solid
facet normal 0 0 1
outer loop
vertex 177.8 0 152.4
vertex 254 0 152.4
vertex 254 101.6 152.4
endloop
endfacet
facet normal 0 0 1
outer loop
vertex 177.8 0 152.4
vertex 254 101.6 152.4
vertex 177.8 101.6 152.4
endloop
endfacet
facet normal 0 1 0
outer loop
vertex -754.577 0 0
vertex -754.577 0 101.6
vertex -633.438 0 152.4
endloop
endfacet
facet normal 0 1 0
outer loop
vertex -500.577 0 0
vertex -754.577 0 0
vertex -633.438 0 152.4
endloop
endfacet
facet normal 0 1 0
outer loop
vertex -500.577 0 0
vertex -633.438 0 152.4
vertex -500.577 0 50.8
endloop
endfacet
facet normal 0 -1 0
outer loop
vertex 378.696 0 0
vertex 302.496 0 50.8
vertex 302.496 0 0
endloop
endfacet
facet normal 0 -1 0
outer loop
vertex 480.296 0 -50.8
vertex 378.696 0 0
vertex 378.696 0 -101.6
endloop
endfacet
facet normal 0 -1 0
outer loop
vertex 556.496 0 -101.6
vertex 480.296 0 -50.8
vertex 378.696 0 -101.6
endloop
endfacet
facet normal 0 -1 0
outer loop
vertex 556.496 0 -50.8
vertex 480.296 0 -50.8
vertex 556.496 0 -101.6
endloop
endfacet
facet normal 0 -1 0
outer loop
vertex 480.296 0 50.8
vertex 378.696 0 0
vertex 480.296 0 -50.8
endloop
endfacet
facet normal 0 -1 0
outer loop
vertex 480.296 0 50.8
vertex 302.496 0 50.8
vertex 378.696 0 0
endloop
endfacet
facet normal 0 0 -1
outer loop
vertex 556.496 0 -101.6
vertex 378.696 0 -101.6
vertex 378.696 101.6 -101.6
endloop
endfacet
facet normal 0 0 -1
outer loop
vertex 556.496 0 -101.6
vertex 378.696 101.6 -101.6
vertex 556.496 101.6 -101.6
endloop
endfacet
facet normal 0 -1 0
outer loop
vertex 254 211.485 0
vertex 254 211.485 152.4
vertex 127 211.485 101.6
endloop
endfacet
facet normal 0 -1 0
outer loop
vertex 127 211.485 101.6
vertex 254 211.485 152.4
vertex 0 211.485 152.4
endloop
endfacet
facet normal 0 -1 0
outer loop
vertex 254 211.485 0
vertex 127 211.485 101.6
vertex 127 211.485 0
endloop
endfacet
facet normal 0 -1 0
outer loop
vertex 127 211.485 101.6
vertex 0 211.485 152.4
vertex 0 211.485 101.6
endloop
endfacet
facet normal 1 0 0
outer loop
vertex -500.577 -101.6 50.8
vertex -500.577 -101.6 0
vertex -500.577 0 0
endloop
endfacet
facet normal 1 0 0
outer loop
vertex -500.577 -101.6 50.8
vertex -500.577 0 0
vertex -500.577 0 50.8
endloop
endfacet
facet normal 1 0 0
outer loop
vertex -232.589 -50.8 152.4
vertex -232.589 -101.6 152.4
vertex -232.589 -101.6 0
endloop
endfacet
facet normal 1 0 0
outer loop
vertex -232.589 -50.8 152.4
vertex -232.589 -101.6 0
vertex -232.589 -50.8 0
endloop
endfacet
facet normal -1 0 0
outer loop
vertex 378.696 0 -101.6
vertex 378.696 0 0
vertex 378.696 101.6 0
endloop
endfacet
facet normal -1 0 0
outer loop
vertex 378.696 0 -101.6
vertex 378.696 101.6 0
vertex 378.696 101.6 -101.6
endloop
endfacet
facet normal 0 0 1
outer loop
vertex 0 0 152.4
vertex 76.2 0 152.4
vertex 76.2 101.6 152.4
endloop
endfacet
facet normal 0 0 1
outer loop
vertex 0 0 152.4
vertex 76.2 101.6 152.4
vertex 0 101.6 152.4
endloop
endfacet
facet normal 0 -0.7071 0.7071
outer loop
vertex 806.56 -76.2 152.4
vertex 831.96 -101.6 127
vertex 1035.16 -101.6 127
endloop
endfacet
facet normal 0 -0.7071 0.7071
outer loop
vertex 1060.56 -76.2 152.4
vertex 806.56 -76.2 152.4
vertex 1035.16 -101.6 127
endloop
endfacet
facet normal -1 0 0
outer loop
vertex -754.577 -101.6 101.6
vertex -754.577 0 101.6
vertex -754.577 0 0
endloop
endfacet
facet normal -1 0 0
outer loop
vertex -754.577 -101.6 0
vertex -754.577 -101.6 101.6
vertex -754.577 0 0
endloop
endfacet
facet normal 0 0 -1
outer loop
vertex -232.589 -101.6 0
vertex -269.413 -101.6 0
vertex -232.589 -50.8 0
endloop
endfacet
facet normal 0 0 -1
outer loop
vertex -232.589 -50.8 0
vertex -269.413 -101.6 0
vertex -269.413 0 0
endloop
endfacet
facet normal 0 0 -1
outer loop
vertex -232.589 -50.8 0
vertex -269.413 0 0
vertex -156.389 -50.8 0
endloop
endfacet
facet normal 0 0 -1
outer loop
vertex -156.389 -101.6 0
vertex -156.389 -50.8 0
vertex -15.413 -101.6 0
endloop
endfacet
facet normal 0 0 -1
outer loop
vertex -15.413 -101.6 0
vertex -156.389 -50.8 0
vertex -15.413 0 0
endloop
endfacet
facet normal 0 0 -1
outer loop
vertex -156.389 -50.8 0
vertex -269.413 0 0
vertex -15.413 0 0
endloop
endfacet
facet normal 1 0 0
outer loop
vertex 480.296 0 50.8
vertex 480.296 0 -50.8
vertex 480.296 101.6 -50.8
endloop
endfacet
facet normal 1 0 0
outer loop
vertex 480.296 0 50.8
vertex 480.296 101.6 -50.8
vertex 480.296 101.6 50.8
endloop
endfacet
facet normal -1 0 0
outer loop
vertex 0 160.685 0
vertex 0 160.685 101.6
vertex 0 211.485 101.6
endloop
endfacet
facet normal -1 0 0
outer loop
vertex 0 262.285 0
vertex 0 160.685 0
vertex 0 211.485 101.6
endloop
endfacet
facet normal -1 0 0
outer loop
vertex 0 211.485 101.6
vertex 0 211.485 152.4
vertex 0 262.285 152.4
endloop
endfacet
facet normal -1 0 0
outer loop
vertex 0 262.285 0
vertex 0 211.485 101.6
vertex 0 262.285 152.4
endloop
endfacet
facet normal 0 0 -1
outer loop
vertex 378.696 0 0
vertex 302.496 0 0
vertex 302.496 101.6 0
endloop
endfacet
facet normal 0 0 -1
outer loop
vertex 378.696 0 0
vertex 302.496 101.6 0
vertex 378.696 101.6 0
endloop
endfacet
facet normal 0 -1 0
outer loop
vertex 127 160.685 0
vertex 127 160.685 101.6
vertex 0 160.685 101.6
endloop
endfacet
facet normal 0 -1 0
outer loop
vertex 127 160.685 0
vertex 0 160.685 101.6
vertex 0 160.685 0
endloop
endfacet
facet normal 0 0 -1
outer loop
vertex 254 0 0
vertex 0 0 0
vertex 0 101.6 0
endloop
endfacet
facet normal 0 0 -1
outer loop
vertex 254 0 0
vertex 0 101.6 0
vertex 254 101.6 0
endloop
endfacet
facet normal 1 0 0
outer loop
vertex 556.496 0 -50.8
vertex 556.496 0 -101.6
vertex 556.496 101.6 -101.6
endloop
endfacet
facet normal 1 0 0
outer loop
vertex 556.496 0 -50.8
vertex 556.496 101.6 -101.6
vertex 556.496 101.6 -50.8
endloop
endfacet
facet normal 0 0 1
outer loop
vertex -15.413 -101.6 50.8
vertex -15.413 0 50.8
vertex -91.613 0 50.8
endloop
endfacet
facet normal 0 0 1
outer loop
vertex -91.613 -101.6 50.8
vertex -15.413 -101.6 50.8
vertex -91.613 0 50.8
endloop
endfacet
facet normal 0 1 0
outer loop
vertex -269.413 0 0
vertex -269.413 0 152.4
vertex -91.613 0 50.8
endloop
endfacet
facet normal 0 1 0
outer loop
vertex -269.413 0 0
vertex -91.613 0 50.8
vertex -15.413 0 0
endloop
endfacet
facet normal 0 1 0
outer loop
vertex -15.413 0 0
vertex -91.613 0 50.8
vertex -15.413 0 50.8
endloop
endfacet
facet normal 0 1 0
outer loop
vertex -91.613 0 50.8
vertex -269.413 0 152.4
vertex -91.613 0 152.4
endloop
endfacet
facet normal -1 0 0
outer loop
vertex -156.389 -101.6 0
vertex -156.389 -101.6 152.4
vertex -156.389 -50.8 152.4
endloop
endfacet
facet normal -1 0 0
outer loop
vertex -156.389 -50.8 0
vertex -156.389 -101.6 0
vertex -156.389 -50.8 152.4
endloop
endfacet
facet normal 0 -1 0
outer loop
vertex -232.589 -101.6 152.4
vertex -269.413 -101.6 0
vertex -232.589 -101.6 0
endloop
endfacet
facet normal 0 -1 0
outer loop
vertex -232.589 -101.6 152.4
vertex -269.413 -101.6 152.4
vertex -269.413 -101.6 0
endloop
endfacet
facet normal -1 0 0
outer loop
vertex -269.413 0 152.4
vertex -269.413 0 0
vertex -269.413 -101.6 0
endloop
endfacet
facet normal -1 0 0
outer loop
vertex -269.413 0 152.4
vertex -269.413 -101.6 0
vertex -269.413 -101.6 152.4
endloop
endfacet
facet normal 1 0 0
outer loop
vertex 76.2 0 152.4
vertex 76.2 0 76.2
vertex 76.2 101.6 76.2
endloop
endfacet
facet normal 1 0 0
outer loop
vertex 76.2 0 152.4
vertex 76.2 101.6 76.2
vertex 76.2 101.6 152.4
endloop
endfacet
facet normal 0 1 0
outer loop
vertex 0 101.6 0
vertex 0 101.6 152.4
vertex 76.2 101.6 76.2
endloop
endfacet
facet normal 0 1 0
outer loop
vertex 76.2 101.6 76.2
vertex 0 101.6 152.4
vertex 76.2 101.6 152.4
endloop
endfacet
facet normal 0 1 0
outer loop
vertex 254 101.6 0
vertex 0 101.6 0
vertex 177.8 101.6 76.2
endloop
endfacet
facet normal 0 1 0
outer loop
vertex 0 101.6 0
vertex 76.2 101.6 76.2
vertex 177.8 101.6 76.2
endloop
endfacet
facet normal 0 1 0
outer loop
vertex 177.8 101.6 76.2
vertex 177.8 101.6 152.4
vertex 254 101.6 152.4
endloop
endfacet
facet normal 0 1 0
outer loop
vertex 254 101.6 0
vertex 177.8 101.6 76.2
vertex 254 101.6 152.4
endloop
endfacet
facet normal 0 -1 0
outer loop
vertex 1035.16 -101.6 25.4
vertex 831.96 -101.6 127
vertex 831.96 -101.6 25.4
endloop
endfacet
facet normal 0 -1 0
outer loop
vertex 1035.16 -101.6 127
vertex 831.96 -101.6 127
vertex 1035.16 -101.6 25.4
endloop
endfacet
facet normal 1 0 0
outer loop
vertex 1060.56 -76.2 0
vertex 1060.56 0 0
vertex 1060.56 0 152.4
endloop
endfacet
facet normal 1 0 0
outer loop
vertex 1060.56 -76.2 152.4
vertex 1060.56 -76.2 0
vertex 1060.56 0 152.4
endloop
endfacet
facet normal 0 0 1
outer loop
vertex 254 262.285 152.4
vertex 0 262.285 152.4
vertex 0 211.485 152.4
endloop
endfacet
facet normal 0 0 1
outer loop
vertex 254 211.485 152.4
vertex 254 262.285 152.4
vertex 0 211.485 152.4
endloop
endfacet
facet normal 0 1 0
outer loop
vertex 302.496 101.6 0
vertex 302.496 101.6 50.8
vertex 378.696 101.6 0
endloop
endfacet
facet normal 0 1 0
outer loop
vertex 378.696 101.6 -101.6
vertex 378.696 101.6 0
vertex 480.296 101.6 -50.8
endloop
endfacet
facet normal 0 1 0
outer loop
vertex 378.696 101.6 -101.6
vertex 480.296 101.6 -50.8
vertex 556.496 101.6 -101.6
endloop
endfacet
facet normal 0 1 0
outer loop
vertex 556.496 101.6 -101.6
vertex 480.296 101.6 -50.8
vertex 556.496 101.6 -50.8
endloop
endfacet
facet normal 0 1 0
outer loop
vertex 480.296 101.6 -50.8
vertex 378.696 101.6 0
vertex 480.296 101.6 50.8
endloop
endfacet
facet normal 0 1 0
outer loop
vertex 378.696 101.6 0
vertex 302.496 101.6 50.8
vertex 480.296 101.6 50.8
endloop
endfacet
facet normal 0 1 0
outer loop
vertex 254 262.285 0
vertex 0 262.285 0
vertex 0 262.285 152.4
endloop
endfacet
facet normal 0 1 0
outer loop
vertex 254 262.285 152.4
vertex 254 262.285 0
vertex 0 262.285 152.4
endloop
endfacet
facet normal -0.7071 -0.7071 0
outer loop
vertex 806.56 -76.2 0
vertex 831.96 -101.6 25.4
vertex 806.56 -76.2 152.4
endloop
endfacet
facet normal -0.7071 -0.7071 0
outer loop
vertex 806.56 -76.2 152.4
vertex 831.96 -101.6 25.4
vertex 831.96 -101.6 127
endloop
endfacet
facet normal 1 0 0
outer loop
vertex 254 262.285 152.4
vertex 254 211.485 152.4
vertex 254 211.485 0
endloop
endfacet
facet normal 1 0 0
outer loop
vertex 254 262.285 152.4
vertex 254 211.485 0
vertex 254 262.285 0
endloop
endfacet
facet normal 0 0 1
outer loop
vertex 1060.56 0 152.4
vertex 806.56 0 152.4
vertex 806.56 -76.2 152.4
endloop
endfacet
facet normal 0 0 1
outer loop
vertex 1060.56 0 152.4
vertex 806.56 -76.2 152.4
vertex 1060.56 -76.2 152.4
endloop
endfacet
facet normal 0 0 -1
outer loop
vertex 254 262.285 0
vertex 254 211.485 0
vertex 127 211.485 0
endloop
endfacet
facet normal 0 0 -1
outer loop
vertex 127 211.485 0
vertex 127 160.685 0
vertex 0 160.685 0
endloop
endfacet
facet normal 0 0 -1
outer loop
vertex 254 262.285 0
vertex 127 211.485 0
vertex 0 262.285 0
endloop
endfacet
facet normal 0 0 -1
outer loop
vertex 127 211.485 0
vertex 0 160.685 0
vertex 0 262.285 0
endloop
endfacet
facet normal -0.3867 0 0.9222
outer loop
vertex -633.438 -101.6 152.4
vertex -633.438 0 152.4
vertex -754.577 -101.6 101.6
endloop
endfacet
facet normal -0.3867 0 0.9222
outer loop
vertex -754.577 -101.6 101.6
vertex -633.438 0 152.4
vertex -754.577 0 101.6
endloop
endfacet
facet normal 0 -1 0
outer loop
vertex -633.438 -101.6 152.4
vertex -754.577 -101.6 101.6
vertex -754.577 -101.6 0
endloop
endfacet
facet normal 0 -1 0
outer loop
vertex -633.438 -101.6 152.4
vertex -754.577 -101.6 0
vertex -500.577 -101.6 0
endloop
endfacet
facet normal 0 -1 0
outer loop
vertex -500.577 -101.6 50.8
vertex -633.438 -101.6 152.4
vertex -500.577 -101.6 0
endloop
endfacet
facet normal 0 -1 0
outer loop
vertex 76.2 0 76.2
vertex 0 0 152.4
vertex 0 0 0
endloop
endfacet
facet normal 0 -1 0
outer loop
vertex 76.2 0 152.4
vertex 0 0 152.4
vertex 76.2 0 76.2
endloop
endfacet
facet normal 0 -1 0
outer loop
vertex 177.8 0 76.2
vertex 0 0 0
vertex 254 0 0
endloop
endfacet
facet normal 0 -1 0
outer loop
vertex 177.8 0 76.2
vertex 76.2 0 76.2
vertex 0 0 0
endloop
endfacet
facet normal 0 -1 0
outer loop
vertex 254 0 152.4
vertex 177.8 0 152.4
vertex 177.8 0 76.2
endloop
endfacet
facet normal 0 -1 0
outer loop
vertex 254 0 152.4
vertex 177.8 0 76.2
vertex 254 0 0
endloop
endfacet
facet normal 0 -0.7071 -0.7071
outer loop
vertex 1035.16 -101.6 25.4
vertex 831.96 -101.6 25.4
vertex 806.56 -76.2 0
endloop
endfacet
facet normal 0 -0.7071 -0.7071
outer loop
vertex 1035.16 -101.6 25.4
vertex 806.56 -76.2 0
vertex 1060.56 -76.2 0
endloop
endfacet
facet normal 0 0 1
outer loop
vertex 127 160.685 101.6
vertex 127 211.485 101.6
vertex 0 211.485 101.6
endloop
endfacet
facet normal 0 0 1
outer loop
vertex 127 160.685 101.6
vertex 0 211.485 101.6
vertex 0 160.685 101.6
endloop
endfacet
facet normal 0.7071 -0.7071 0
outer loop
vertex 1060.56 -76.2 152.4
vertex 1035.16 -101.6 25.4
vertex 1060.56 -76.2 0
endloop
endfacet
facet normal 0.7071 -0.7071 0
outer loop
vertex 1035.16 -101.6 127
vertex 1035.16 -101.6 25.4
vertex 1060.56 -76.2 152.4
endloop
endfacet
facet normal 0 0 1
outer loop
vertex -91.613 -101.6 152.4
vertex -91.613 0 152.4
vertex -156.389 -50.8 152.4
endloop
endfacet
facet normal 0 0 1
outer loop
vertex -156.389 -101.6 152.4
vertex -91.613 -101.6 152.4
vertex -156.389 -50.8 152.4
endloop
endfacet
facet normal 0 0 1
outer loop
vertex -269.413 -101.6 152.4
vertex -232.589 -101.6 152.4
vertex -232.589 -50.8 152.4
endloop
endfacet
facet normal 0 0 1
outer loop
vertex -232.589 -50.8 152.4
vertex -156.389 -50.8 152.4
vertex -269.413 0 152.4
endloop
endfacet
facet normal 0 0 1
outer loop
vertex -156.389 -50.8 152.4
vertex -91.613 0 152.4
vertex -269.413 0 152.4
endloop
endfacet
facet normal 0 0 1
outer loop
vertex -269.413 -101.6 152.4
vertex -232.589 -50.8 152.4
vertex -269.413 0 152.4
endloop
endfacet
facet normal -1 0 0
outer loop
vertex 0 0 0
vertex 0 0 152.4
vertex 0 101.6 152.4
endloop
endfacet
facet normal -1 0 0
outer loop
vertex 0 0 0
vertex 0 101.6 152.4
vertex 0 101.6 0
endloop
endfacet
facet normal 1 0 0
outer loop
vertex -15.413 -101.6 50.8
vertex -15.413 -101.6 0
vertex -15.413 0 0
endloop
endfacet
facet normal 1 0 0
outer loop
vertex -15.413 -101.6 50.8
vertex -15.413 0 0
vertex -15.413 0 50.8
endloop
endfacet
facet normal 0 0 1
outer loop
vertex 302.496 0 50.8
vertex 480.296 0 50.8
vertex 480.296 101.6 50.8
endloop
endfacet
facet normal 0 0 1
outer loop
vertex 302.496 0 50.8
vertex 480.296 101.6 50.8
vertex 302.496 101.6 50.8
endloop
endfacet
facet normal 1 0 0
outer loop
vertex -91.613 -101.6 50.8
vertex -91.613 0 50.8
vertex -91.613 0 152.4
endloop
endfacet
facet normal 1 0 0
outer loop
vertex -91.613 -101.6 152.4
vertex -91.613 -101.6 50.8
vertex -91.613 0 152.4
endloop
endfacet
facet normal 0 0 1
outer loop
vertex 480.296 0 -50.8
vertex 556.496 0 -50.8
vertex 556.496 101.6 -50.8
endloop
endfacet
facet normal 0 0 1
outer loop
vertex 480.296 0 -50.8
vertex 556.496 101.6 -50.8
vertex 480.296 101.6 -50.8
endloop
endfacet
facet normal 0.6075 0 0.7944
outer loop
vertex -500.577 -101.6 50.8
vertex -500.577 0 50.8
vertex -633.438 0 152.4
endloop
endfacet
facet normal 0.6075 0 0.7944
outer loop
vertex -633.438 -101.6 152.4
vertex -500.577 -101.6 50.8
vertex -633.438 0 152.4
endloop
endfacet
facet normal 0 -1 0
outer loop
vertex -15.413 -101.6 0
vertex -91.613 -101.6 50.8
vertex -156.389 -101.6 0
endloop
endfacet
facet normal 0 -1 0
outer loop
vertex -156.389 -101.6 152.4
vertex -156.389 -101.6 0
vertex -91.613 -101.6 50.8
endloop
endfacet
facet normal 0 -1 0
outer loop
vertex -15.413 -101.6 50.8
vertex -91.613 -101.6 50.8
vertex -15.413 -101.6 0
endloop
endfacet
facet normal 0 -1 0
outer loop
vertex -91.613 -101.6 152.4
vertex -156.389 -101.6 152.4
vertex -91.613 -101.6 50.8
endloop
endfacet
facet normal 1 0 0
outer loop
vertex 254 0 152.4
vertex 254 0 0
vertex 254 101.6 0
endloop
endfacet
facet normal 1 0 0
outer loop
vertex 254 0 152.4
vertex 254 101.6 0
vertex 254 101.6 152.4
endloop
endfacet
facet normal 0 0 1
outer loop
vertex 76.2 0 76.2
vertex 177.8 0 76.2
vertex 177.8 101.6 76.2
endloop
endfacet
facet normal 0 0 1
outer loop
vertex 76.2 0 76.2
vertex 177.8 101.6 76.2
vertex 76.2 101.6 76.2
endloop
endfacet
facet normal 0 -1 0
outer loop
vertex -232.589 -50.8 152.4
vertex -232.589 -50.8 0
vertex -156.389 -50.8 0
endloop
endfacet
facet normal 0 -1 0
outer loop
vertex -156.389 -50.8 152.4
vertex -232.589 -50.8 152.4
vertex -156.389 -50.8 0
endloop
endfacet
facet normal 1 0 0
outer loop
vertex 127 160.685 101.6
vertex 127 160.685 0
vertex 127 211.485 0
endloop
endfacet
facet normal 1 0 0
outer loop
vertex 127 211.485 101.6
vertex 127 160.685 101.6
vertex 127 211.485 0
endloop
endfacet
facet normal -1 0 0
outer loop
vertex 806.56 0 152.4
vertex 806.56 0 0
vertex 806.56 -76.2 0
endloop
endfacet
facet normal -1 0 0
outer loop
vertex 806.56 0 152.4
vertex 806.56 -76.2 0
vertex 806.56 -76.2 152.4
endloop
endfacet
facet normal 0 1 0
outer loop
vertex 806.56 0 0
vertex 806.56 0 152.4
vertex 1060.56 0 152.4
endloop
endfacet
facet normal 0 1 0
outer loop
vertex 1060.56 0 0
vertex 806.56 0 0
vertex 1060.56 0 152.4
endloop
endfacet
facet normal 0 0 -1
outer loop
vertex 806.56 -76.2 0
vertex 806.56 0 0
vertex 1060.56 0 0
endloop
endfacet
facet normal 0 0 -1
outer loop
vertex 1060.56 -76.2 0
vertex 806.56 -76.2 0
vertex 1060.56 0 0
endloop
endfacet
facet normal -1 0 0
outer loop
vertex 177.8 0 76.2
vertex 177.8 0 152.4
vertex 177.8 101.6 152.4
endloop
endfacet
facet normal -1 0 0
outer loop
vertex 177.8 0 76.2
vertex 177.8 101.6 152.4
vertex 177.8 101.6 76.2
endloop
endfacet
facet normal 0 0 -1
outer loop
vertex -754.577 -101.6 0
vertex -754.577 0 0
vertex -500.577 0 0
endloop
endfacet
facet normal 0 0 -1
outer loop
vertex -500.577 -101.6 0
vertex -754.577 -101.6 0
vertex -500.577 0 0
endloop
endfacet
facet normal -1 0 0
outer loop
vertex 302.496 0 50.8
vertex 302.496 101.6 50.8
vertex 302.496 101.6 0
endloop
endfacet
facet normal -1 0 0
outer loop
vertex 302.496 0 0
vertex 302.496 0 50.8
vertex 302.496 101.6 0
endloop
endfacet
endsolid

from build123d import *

# Parameters (mm, degrees)
F1_DEPTH  = 101.6
F3_DEPTH  = 254
F4_W      = 50.8
F4_H      = 101.6
F5_DEPTH  = 127
F6_W      = 50.8
F6_H      = 152.4
F7_DEPTH  = 101.6
F8_W      = 76.2
F8_H      = 50.8
F9_DEPTH  = 152.4
F11_DEPTH = 101.6
F13_DEPTH = 101.6
F14_W     = 254
F14_H     = 152.4
F15_DEPTH = 101.6
F16_SIZE  = 25.4


with BuildPart() as f1:
    # F0 (on Front) → F1 (new body)
    with BuildSketch(Plane.XZ):
        Polygon((0, 152.4), (0, 0), (254, 0), (254, 152.4), (177.8, 152.4), (177.8, 76.2), (76.2, 76.2), (76.2, 152.4), align=None)
    extrude(amount=-F1_DEPTH)


with BuildPart() as f3:
    # F2 (on Right) → F3 (new body)
    with BuildSketch(Plane.YZ):
        Polygon((160.685088, 101.6), (160.685088, 0), (262.285088, 0), (262.285088, 152.4), (211.485088, 152.4), (211.485088, 101.6), align=None)
    extrude(amount=F3_DEPTH)

    # F4 (on face) → F5 (cut)
    with BuildSketch(Plane.YZ.offset(254)):
        with Locations((186.085088, 50.8)):
            Rectangle(F4_W, F4_H)
    extrude(amount=-F5_DEPTH, mode=Mode.SUBTRACT)


with BuildPart() as f7:
    # F6 (on Front) → F7 (new body)
    with BuildSketch(Plane.XZ):
        Polygon((-218.613389, 152.4), (-218.613389, 0), (-15.413389, 0), (-15.413389, 50.8), (-91.613389, 50.8), (-91.613389, 152.4), align=None)
        with Locations((-244.013389, 76.2)):
            Rectangle(F6_W, F6_H)
    extrude(amount=F7_DEPTH)

    # F8 (on face) → F9 (cut)
    with BuildSketch(Plane.XY.offset(152.4)):
        with Locations((-194.488992, -76.2)):
            Rectangle(F8_W, F8_H)
    extrude(amount=-F9_DEPTH, mode=Mode.SUBTRACT)


with BuildPart() as f11:
    # F10 (on Front) → F11 (new body)
    with BuildSketch(Plane.XZ):
        Polygon((302.495933, 50.8), (302.495933, 0), (378.695933, 0), (378.695933, -101.6), (556.495933, -101.6), (556.495933, -50.8), (480.295933, -50.8), (480.295933, 50.8), align=None)
    extrude(amount=-F11_DEPTH)


with BuildPart() as f13:
    # F12 (on Front) → F13 (new body)
    with BuildSketch(Plane.XZ):
        Polygon((-754.576748, 101.6), (-754.576748, 0), (-500.576748, 0), (-500.576748, 50.8), (-633.438297, 152.4), align=None)
    extrude(amount=F13_DEPTH)


with BuildPart() as f15:
    # F14 (on Front) → F15 (new body)
    with BuildSketch(Plane.XZ):
        with Locations((933.560318, 76.2)):
            Rectangle(F14_W, F14_H)
    extrude(amount=F15_DEPTH)

    # F16
    f16_edges = [f15.edges().sort_by_distance(p)[0] for p in [
        (806.560318, -101.6, 76.2),
        (933.560318, -101.6, 0),
        (1060.560318, -101.6, 76.2),
        (933.560318, -101.6, 152.4),
    ]]
    chamfer(f16_edges, length=F16_SIZE)


solid = Compound([f1.part, f3.part, f7.part, f11.part, f13.part, f15.part])
